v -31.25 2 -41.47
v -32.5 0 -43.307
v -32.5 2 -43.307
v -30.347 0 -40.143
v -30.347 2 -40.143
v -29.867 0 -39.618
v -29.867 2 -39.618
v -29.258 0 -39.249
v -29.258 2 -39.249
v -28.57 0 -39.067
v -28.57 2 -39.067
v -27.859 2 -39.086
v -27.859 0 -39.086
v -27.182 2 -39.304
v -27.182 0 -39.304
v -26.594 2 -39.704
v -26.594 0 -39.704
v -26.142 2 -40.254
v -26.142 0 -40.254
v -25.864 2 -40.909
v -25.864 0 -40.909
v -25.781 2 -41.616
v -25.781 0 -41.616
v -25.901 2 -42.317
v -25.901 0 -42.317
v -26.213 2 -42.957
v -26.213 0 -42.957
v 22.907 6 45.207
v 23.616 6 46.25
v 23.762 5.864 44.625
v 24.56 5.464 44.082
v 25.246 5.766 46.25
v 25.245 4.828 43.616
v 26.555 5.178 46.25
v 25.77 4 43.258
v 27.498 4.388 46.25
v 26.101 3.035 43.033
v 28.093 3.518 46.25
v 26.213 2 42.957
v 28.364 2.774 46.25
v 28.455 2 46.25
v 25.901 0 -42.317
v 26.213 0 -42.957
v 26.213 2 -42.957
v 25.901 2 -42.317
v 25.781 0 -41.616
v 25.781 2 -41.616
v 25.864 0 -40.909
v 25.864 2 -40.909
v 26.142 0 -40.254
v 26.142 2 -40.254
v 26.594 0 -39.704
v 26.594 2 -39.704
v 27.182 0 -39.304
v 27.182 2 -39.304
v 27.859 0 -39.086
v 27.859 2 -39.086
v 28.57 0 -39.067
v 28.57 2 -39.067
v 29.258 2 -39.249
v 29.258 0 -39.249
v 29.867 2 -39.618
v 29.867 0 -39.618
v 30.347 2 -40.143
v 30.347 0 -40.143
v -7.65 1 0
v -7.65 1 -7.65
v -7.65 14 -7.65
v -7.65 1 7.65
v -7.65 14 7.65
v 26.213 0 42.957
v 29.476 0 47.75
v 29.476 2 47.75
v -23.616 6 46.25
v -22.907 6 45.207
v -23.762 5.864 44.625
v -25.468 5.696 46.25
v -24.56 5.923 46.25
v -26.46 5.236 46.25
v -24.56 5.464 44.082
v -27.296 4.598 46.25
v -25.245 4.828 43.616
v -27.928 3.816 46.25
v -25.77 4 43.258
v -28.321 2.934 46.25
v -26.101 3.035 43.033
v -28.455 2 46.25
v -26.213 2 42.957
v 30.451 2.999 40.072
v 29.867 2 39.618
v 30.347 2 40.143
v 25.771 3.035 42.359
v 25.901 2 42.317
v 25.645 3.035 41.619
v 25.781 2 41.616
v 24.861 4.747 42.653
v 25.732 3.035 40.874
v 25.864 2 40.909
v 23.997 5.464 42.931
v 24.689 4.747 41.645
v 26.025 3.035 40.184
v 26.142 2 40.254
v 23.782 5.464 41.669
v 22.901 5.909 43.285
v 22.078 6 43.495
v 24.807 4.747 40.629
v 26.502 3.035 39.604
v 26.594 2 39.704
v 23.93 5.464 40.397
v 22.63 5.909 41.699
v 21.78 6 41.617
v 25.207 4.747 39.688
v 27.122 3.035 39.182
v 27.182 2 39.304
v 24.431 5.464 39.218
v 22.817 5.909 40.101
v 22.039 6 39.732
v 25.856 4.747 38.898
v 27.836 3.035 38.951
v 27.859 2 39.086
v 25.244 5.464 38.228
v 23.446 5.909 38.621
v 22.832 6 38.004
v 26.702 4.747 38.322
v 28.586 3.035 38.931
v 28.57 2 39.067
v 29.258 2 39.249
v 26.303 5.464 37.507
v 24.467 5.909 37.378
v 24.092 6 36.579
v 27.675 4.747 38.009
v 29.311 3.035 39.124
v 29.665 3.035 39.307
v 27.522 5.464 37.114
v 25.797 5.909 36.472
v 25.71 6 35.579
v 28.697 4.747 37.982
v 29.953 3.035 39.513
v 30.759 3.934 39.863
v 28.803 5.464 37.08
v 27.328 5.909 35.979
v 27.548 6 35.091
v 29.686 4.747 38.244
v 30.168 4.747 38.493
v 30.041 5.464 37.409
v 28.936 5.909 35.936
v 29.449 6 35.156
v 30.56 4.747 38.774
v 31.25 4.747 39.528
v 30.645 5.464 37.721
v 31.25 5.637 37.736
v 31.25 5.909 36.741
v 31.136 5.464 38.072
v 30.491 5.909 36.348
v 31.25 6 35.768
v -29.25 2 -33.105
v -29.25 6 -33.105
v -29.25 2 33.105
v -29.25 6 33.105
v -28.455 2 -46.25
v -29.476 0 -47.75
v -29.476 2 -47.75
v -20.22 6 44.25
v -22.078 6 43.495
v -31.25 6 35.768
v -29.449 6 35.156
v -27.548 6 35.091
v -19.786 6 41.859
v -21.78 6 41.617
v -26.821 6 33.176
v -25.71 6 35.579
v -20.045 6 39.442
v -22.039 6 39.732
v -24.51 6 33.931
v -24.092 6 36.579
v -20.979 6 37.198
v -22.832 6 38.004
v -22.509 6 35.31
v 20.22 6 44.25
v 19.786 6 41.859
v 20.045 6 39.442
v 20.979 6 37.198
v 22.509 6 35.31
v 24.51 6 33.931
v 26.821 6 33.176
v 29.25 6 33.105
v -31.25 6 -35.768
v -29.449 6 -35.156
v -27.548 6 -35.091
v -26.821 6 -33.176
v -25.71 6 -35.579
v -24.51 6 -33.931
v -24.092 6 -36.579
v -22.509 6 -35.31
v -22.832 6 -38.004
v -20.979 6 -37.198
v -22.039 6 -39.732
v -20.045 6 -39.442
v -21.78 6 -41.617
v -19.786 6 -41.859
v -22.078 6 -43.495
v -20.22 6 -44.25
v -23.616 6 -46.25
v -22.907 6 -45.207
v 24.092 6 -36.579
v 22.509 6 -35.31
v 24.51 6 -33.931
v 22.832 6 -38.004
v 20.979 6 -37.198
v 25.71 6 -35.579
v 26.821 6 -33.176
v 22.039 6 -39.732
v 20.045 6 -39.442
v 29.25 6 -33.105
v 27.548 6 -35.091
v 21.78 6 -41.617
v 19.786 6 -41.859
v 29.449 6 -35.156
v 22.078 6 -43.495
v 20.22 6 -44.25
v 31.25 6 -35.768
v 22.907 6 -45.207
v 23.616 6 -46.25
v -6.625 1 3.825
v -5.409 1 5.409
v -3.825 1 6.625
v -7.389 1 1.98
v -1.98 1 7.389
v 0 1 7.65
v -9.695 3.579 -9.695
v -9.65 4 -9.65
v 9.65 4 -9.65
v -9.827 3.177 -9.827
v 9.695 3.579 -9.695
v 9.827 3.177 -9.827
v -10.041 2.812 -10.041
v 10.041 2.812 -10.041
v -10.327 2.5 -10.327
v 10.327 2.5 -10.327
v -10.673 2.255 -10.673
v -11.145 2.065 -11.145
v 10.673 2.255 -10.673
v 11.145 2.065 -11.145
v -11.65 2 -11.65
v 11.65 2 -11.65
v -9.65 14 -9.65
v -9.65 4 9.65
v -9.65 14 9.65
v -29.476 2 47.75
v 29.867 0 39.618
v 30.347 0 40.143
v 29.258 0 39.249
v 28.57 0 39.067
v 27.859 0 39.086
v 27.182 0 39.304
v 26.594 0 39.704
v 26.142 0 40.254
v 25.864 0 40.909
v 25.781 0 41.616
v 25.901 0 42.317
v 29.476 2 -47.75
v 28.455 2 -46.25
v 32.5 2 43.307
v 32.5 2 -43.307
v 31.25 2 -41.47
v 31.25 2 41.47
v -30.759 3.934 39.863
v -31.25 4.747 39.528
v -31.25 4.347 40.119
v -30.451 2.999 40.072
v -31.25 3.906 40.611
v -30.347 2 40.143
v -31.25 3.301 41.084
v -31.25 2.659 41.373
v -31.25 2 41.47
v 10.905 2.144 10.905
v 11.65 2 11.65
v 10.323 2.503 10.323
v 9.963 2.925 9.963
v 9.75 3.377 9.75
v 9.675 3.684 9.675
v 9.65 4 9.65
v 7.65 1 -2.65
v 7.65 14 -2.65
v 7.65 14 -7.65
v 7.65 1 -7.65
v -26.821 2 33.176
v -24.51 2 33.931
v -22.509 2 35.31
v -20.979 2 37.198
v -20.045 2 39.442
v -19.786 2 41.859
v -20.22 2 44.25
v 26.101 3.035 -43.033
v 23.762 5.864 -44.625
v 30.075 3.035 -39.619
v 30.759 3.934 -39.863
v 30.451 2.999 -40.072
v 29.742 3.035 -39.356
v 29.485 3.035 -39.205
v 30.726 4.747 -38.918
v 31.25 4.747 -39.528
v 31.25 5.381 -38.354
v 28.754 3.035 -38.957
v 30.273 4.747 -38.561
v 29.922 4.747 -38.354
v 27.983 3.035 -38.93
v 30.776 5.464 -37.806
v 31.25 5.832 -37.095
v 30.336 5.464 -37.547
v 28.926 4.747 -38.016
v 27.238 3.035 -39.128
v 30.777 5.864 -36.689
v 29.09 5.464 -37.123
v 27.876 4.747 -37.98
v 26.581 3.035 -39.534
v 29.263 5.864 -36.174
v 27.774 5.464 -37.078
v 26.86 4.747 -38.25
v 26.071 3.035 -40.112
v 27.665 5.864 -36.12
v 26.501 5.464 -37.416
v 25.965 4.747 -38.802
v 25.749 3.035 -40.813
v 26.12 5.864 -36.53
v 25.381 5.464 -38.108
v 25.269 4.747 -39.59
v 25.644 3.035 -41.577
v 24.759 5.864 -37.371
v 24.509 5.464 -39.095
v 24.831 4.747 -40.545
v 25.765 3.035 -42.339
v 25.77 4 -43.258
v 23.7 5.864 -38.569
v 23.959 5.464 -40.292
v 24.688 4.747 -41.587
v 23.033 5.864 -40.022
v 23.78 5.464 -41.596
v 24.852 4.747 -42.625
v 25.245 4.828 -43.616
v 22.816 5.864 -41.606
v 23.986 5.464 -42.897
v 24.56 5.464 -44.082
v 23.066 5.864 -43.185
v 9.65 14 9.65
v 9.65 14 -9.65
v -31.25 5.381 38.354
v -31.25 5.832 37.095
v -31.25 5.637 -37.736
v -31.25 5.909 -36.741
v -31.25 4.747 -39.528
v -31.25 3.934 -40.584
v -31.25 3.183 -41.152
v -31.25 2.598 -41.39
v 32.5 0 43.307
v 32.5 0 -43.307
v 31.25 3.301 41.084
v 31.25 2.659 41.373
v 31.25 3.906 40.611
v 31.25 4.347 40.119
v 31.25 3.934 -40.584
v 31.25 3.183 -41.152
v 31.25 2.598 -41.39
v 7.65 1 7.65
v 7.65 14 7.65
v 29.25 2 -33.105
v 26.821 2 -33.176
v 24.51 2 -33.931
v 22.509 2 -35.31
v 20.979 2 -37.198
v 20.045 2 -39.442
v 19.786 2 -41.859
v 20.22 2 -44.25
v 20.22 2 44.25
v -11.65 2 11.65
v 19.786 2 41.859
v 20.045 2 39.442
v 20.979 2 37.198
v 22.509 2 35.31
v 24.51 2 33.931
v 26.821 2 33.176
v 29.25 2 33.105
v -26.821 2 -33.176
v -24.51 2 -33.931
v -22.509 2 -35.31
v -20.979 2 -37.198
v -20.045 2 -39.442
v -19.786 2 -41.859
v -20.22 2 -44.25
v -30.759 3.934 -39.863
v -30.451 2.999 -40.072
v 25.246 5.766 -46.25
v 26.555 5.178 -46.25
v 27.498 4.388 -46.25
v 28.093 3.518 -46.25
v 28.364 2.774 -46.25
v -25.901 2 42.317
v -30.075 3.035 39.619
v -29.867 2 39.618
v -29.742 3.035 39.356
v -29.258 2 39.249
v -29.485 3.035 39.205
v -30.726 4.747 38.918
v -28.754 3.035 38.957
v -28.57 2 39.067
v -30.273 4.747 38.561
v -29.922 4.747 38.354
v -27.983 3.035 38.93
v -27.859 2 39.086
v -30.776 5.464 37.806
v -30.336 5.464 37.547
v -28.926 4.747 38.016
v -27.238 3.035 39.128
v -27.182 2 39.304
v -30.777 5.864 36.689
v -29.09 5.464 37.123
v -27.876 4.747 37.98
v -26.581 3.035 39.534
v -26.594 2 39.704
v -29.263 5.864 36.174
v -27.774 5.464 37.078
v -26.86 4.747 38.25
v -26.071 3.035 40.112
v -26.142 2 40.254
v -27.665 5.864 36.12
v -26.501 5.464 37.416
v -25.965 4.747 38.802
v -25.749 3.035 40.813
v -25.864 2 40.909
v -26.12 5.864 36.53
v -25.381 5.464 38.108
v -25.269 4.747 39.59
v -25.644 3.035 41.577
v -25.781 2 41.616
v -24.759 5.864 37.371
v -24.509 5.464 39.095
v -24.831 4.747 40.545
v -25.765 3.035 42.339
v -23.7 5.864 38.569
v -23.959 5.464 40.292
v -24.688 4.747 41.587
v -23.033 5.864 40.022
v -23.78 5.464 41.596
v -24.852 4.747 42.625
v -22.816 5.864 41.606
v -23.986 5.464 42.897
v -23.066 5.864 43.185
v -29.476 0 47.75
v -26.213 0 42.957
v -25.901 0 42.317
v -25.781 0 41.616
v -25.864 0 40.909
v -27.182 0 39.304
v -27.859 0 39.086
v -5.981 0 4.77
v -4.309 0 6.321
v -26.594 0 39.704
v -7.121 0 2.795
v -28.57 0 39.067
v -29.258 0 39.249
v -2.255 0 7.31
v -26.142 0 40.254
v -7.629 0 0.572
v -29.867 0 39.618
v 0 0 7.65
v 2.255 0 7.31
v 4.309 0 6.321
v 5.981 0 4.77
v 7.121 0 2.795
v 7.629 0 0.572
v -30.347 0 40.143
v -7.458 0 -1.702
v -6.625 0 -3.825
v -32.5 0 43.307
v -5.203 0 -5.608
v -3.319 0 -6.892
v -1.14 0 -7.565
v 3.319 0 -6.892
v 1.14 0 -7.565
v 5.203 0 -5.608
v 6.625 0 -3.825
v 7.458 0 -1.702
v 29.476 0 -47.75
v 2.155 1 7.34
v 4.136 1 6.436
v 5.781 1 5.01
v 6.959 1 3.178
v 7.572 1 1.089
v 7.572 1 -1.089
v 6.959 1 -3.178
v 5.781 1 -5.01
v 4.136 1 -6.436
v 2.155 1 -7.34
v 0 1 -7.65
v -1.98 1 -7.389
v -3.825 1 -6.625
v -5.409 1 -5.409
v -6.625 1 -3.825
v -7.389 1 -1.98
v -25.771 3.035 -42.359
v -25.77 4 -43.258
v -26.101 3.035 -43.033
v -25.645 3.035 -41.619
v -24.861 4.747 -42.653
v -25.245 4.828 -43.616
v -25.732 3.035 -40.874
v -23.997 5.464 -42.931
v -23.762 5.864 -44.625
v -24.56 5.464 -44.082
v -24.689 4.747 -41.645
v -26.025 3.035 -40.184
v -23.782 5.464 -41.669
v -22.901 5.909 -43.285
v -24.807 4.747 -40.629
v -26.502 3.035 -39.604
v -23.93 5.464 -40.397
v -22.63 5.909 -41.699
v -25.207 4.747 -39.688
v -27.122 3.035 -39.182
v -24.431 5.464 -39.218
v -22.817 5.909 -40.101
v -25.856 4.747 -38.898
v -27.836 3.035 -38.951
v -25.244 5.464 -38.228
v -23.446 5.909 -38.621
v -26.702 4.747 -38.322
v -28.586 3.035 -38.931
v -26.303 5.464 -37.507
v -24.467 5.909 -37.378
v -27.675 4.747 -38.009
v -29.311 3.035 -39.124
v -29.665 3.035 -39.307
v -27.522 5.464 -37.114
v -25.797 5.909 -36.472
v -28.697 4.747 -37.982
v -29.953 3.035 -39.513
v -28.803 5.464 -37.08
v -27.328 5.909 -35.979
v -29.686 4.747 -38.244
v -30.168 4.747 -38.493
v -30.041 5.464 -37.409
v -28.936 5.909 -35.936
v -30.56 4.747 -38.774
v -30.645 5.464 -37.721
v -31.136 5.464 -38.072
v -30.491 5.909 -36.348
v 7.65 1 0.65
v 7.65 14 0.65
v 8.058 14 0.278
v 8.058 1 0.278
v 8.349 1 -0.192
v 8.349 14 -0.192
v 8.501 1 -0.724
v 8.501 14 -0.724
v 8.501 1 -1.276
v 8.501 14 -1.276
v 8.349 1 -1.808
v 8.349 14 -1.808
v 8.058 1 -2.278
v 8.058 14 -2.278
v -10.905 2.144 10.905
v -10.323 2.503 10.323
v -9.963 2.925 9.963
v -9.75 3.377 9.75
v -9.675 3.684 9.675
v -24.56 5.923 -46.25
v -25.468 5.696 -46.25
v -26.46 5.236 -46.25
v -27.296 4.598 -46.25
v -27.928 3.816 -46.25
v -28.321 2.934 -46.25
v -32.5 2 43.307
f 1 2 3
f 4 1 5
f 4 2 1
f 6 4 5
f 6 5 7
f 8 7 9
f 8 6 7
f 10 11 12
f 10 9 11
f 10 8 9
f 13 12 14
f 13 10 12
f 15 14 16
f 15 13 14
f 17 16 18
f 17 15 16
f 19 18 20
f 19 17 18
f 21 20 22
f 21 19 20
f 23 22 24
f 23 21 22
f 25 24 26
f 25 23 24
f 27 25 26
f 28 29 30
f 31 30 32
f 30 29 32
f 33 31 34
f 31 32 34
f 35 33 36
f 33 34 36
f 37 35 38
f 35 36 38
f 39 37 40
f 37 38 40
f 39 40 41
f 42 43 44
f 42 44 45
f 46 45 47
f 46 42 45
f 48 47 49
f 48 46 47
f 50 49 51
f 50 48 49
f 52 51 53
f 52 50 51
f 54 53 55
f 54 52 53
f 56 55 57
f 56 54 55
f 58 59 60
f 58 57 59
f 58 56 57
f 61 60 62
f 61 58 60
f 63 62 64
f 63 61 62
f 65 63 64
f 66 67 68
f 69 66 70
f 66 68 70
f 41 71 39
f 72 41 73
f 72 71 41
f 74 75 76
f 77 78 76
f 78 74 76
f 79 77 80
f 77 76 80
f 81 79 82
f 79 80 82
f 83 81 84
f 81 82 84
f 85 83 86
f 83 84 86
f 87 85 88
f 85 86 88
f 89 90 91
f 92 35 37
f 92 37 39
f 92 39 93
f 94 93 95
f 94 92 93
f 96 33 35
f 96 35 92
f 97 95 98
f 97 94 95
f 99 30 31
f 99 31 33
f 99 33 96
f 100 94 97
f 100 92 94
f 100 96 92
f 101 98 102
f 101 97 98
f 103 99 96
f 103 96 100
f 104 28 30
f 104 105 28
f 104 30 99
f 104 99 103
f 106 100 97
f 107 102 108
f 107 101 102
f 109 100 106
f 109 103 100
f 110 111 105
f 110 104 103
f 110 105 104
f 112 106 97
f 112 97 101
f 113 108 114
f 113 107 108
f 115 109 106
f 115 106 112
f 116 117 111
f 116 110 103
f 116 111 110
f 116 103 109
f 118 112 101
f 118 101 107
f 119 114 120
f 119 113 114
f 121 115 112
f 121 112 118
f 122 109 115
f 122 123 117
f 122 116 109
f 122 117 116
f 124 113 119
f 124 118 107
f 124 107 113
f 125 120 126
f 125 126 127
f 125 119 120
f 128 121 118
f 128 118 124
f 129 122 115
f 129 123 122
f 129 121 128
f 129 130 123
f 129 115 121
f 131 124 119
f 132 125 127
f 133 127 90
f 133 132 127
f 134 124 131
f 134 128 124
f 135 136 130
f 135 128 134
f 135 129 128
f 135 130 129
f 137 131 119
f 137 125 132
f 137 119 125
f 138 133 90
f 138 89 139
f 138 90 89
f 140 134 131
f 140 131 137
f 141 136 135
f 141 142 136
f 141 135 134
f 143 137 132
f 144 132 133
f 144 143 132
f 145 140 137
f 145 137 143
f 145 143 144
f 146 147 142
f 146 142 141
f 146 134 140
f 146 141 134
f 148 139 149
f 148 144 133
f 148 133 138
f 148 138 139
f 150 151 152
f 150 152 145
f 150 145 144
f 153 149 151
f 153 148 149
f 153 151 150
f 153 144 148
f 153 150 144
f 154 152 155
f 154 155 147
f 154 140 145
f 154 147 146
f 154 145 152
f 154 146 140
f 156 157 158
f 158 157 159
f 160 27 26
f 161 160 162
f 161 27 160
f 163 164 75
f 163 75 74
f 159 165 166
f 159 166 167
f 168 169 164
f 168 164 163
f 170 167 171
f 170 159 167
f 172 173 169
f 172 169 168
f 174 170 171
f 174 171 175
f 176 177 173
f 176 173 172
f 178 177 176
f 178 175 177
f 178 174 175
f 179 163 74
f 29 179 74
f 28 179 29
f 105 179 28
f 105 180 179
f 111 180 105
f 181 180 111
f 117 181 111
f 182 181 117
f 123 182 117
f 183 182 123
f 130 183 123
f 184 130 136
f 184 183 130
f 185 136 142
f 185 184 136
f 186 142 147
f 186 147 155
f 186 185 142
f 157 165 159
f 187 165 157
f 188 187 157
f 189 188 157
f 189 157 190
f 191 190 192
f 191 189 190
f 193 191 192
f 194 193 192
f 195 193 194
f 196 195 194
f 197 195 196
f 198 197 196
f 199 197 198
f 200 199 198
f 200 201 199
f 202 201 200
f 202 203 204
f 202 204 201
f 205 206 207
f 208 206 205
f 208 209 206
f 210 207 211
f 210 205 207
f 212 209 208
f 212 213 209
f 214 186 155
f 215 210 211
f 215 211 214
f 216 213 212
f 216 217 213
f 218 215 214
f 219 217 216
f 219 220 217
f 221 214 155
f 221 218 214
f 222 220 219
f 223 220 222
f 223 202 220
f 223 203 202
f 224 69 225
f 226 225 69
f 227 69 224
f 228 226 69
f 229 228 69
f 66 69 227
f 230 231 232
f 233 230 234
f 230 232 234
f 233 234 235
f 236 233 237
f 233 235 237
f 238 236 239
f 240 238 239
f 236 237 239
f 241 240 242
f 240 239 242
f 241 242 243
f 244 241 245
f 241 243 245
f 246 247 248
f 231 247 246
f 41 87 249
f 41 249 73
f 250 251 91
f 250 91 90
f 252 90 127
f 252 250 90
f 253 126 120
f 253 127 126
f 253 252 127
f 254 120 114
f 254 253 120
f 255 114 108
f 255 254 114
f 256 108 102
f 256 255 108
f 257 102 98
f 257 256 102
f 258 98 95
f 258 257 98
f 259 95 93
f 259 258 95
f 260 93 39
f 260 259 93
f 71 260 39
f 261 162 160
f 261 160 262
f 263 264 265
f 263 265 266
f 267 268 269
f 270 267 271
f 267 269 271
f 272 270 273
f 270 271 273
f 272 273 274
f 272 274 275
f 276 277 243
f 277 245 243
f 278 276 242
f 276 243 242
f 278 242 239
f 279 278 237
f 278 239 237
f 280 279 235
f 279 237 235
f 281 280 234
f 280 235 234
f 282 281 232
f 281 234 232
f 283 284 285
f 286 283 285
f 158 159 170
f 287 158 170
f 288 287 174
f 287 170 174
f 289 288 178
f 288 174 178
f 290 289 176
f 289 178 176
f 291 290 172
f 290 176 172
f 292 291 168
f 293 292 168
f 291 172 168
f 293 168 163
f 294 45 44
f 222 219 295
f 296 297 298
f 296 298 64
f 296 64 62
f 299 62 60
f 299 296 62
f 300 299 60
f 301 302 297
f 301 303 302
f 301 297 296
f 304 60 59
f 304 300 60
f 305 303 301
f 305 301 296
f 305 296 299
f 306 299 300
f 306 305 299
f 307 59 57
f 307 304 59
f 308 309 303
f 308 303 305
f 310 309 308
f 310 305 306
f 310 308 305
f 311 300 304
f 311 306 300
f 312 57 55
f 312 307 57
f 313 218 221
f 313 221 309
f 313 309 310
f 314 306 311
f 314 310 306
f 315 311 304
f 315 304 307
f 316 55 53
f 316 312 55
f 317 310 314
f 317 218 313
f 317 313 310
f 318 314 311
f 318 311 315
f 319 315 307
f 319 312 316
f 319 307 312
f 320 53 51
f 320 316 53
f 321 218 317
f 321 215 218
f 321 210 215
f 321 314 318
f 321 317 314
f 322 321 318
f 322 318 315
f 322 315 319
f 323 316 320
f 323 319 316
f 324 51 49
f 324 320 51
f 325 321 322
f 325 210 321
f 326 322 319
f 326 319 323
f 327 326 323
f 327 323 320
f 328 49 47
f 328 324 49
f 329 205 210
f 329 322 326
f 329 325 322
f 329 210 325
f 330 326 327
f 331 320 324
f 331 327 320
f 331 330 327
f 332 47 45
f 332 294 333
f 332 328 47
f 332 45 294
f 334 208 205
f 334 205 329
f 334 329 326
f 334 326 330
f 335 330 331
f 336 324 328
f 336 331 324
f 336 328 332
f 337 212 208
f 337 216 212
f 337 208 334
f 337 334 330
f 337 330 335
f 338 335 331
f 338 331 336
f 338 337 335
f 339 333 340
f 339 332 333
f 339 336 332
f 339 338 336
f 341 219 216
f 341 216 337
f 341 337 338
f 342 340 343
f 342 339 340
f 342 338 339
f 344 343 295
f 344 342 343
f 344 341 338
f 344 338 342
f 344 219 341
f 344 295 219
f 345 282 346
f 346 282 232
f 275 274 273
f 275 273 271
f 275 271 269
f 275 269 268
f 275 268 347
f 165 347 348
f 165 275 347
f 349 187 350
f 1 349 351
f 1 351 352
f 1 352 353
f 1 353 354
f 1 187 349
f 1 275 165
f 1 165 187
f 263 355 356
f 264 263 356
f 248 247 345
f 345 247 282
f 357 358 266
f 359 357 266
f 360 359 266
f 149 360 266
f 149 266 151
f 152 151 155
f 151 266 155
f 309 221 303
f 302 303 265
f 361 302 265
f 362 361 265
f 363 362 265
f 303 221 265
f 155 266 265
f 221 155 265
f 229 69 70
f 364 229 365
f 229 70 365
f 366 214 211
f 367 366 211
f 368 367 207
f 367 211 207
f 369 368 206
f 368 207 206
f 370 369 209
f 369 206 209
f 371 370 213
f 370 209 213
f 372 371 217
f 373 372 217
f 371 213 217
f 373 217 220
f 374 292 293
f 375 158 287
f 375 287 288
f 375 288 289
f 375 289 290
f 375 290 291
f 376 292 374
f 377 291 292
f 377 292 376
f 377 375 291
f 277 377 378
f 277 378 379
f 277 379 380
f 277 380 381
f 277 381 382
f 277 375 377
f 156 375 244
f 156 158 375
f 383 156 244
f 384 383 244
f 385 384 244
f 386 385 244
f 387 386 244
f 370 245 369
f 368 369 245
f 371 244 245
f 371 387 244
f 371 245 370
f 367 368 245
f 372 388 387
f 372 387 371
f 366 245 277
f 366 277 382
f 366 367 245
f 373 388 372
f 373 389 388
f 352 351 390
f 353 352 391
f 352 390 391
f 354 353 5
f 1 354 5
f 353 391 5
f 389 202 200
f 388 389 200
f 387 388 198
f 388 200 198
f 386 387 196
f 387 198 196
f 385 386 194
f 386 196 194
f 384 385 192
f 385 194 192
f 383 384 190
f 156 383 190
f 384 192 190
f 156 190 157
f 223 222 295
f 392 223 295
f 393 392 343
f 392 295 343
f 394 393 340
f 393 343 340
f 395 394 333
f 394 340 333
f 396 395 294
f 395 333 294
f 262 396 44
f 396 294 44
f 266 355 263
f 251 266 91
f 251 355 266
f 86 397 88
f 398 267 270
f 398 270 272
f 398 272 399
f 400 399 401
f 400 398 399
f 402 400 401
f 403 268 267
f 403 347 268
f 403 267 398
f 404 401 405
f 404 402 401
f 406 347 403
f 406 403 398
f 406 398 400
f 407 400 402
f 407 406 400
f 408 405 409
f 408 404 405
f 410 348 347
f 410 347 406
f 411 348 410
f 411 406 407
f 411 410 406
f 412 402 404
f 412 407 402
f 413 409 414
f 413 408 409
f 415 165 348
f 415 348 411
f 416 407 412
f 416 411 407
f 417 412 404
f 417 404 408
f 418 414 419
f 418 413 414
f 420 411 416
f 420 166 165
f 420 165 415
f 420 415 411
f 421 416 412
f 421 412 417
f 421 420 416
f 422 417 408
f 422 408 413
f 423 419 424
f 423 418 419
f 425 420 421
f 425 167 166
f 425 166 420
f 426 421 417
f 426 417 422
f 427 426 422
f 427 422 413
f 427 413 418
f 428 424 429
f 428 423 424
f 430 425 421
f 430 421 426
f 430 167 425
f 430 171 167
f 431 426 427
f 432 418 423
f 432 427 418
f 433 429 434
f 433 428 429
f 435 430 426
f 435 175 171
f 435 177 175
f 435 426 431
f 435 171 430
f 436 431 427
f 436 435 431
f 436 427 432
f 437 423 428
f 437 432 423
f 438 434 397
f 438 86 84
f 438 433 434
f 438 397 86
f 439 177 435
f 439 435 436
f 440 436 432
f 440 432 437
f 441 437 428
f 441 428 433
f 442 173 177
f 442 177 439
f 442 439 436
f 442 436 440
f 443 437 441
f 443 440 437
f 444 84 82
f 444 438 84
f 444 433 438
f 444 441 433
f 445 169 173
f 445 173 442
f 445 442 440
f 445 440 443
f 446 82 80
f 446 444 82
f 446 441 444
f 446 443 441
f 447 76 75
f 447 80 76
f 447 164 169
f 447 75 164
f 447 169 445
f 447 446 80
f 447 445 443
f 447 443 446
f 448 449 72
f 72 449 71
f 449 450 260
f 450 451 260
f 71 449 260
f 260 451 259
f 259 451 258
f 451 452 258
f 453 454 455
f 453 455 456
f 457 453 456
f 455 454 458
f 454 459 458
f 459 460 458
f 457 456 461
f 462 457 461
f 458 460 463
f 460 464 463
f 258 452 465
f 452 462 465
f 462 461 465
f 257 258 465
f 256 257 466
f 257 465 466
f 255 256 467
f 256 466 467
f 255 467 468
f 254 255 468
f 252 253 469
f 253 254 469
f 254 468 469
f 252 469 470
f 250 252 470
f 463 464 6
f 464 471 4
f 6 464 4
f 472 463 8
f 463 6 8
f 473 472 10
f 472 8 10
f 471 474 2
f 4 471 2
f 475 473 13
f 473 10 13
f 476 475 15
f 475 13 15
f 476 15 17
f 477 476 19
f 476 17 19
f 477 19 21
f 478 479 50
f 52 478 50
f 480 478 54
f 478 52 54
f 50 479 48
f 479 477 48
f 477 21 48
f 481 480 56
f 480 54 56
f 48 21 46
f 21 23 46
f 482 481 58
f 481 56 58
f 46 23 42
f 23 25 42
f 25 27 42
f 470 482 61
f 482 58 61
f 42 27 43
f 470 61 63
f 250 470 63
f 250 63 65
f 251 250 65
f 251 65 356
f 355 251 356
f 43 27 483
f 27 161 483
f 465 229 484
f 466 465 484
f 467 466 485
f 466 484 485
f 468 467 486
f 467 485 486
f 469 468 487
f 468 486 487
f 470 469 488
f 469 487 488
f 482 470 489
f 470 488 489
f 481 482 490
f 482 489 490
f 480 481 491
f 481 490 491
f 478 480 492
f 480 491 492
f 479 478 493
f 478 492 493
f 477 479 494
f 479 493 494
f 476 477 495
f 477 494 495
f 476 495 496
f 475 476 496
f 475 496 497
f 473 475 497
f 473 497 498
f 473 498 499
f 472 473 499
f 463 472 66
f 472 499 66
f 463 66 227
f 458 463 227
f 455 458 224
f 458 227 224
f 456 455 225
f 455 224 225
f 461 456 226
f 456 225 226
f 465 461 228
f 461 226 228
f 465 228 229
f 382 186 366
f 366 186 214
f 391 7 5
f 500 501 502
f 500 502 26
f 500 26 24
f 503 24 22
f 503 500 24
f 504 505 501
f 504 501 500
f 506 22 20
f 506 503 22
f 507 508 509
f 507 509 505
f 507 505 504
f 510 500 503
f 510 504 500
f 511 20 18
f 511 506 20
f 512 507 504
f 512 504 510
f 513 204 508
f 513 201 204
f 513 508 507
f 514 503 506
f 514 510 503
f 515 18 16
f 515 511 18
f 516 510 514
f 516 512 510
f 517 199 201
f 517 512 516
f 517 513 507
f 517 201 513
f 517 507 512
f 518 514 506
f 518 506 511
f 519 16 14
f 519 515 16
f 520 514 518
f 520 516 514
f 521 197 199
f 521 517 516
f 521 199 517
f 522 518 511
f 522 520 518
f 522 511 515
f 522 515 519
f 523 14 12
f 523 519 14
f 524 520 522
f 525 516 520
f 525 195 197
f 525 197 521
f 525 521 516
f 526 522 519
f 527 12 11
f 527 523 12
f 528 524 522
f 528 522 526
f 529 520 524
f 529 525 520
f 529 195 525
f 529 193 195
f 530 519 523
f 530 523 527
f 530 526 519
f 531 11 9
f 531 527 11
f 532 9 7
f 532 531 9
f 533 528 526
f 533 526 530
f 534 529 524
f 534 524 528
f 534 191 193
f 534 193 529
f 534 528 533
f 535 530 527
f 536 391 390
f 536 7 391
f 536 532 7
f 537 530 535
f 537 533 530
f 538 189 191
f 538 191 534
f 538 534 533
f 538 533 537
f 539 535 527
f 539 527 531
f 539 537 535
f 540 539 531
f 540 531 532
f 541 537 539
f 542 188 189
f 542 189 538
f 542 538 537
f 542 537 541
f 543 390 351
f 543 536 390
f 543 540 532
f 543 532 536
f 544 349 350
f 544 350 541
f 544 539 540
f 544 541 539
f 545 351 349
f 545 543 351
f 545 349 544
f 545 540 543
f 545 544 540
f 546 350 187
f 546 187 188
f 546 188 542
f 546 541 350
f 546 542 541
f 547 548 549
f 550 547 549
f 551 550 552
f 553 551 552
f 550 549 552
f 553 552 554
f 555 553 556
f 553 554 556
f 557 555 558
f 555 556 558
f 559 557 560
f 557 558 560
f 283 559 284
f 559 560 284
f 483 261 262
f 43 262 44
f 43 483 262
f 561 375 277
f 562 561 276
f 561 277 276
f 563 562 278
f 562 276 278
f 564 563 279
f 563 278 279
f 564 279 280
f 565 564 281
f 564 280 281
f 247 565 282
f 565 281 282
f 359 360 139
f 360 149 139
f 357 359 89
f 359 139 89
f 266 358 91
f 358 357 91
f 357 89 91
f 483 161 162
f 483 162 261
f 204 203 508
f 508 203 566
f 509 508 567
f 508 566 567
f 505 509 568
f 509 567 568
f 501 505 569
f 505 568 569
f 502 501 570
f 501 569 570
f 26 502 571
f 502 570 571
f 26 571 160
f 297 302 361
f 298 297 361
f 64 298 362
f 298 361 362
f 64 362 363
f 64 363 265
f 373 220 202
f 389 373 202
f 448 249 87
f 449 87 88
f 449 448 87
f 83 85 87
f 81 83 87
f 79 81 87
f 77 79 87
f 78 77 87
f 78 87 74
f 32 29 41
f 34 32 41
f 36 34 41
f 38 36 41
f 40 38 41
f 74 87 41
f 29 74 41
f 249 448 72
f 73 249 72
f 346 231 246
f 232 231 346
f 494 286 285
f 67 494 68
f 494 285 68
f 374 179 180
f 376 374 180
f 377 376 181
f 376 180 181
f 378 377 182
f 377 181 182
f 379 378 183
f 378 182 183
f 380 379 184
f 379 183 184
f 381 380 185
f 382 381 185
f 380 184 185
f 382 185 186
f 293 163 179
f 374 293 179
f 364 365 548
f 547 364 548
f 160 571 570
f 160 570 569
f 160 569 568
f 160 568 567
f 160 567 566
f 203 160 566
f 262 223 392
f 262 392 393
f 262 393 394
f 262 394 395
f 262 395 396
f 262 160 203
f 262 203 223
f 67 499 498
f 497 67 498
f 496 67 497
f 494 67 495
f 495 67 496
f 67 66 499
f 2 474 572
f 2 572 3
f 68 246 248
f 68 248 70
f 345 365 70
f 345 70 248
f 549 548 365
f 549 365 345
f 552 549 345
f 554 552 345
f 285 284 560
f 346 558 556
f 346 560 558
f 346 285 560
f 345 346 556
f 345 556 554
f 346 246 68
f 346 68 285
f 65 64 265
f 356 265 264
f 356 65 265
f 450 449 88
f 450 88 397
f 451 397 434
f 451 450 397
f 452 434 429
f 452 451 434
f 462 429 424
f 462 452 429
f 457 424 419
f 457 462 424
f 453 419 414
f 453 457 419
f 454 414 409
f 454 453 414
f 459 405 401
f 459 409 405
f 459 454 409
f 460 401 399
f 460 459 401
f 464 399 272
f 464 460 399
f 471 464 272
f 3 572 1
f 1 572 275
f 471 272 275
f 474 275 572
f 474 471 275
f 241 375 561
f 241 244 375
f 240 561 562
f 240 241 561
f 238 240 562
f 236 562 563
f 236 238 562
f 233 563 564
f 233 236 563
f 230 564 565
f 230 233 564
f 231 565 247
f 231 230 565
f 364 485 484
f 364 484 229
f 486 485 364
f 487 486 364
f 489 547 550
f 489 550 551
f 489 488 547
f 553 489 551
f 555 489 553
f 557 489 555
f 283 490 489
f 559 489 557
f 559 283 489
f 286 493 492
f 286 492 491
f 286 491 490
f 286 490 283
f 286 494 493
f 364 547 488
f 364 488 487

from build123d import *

# Parameters (mm, degrees)
SKETCH1_W           = 65
SKETCH1_H           = 95.5
BOSS_EXTRUDE1_DEPTH = 2
SKETCH1_3_W         = 62.5
SKETCH1_3_H         = 92.5
BOSS_EXTRUDE2_DEPTH = 6
BOSS_EXTRUDE3_START = 6
SKETCH2_4_W         = 19.3
SKETCH2_4_H         = 19.3
BOSS_EXTRUDE3_DEPTH = 8
SKETCH2_R           = 7.65
CUT_EXTRUDE1_DEPTH  = 19.5
CUT_EXTRUDE2_START  = 40
CUT_EXTRUDE2_DEPTH  = 39
CUT_EXTRUDE3_DEPTH  = 10
FILLET1_R           = 4
SKETCH5_W           = 19.3
SKETCH5_H           = 19.3
CUT_EXTRUDE5_DEPTH  = 4
FILLET2_R           = 2


with BuildPart() as part:
    # Sketch1 → Boss-Extrude1 (new body)
    with BuildSketch(Plane(origin=(0, 0, 0), x_dir=(1, 0, 0), z_dir=(0, 1, 0))):
        Rectangle(SKETCH1_W, SKETCH1_H)
    extrude(amount=BOSS_EXTRUDE1_DEPTH)

    # Sketch1<3> → Boss-Extrude2 (add)
    with BuildSketch(Plane(origin=(0, 0, 0), x_dir=(1, 0, 0), z_dir=(0, 1, 0))):
        Rectangle(SKETCH1_3_W, SKETCH1_3_H)
    extrude(amount=BOSS_EXTRUDE2_DEPTH)

    # Sketch2<4> → Boss-Extrude3 (add)
    with BuildSketch(Plane(origin=(0, 0, 0), x_dir=(1, 0, 0), z_dir=(0, 1, 0)).offset(BOSS_EXTRUDE3_START)):
        Rectangle(SKETCH2_4_W, SKETCH2_4_H)
    extrude(amount=BOSS_EXTRUDE3_DEPTH)

    # Sketch2 → Cut-Extrude1 (cut, symmetric)
    with BuildSketch(Plane(origin=(0, 0, 0), x_dir=(1, 0, 0), z_dir=(0, 1, 0))):
        with Locations(Location((0, 0, 0), (0, 0, 270))):
            Circle(SKETCH2_R)
    extrude(amount=CUT_EXTRUDE1_DEPTH, both=True, mode=Mode.SUBTRACT)

    # Sketch2<3> → Cut-Extrude2 (cut)
    with BuildSketch(Plane(origin=(0, 0, 0), x_dir=(1, 0, 0), z_dir=(0, 1, 0)).offset(CUT_EXTRUDE2_START)):
        with BuildLine():
            Line((9e-09, 7.65), (-7.65, 7.65))
            Line((-7.65, 7.65), (-7.65, 0))
            ThreePointArc((-7.65, 0), (-5.409366873, 5.409366879), (9e-09, 7.65))
        make_face()
        with BuildLine():
            Line((7.65, 7.65), (9e-09, 7.65))
            ThreePointArc((9e-09, 7.65), (7.65, 0), (9e-09, -7.65))
            Line((9e-09, -7.65), (7.65, -7.65))
            Line((7.65, -7.65), (7.65, -0.65))
            ThreePointArc((7.65, -0.65), (8.519734544, 1), (7.65, 2.65))
            Line((7.65, 2.65), (7.65, 7.65))
        make_face()
        with BuildLine():
            ThreePointArc((9e-09, -7.65), (-5.409366873, -5.409366879), (-7.65, 0))
            Line((-7.65, 0), (-7.65, -7.65))
            Line((-7.65, -7.65), (9e-09, -7.65))
        make_face()
    extrude(amount=-CUT_EXTRUDE2_DEPTH, mode=Mode.SUBTRACT)

    # Sketch3 → Cut-Extrude3 (cut)
    with BuildSketch(Plane(origin=(0, 0, 0), x_dir=(1, 0, 0), z_dir=(0, 1, 0))):
        with BuildLine():
            Line((-30.433287704, 49.156662819), (-34.566712296, 46.343337181))
            Line((-34.566712296, 46.343337181), (-30.346723838, 40.143200294))
            ThreePointArc((-30.346723838, 40.143200294), (-26.873348724, 39.483150817), (-26.213299247, 42.956525932))
            Line((-26.213299247, 42.956525932), (-30.433287704, 49.156662819))
        make_face()
        with BuildLine():
            Line((34.566712296, 46.343337181), (30.433287704, 49.156662819))
            Line((30.433287704, 49.156662819), (26.213299247, 42.956525932))
            ThreePointArc((26.213299247, 42.956525932), (26.873348724, 39.483150817), (30.346723838, 40.143200294))
            Line((30.346723838, 40.143200294), (34.566712296, 46.343337181))
        make_face()
        with BuildLine():
            Line((-30.346723838, -40.143200294), (-34.566712296, -46.343337181))
            Line((-34.566712296, -46.343337181), (-30.433287704, -49.156662819))
            Line((-30.433287704, -49.156662819), (-26.213299247, -42.956525932))
            ThreePointArc((-26.213299247, -42.956525932), (-26.873348724, -39.483150817), (-30.346723838, -40.143200294))
        make_face()
        with BuildLine():
            Line((26.213299247, -42.956525932), (30.433287704, -49.156662819))
            Line((30.433287704, -49.156662819), (34.566712296, -46.343337181))
            Line((34.566712296, -46.343337181), (30.346723838, -40.143200294))
            ThreePointArc((30.346723838, -40.143200294), (26.873348724, -39.483150817), (26.213299247, -42.956525932))
        make_face()
    extrude(amount=CUT_EXTRUDE3_DEPTH, mode=Mode.SUBTRACT)

    # Fillet1
    # the kernel refuses this fillet: 4 mm, written as the material it takes off along each edge
    with BuildSketch(Plane(origin=(-36.876651276, 6, 49.737170606), x_dir=(0, -1, 0), z_dir=(0.5626651276372232, 0, -0.826684918297768)), Plane(origin=(30.346723838, 6, 40.143200294), x_dir=(0, -1, 0), z_dir=(0.5626651276372238, 0, 0.8266849182977677)), Plane(origin=(36.876651276, 6, -49.737170606), x_dir=(0, -1, 0), z_dir=(-0.562665127637224, 0, 0.8266849182977676)), Plane(origin=(-30.346723838, 6, -40.143200294), x_dir=(0, -1, 0), z_dir=(-0.5626651276372242, 0, -0.8266849182977674))) as fillet1_piece_1:
        with BuildLine():
            CenterArc((FILLET1_R, FILLET1_R), FILLET1_R, 180, 90)
            Line((0, FILLET1_R), (0, 0))
            Line((0, 0), (FILLET1_R, 0))
        make_face()
    extrude(amount=11.605353019, mode=Mode.SUBTRACT)
    with BuildSketch(Plane(origin=(-26.213299247, 6, 42.956525932), x_dir=(0, -1, 0), z_dir=(-0.5626651276372243, 0, 0.8266849182977672)), Plane(origin=(34.081582088, 6, 54.516849183), x_dir=(0, -1, 0), z_dir=(-0.5626651276372246, 0, -0.826684918297767)), Plane(origin=(26.213299247, 6, -42.956525932), x_dir=(0, -1, 0), z_dir=(0.5626651276372232, 0, -0.826684918297768)), Plane(origin=(-34.081582088, 6, -54.516849183), x_dir=(0, -1, 0), z_dir=(0.562665127637224, 0, 0.8266849182977676))) as fillet1_piece_2:
        with BuildLine():
            CenterArc((FILLET1_R, FILLET1_R), FILLET1_R, 180, 90)
            Line((0, FILLET1_R), (0, 0))
            Line((0, 0), (FILLET1_R, 0))
        make_face()
    extrude(amount=13.983953251, mode=Mode.SUBTRACT)
    with BuildSketch(Plane(origin=(-28.280011543, 6, 41.549863113), x_dir=(-0.8266849182977704, 0, -0.5626651276372198), z_dir=(-0.5626651276372198, 0, 0.8266849182977704))) as fillet1_piece_3:
        with BuildLine():
            CenterArc((2.5 + FILLET1_R, FILLET1_R), FILLET1_R, 180, 90)
            Line((2.5 + FILLET1_R, 0), (2.5, 0))
            Line((2.5, 0), (2.5, FILLET1_R))
        make_face()
    revolve(axis=Axis((-28.280011543, 6, 41.549863113), (0, -1, 0)), revolution_arc=180, mode=Mode.SUBTRACT)
    with BuildSketch(Plane(origin=(28.280011543, 6, 41.549863113), x_dir=(-0.8266849182977659, 0, 0.5626651276372262), z_dir=(0.5626651276372262, 0, 0.8266849182977659))) as fillet1_piece_4:
        with BuildLine():
            CenterArc((2.5 + FILLET1_R, FILLET1_R), FILLET1_R, 180, 90)
            Line((2.5 + FILLET1_R, 0), (2.5, 0))
            Line((2.5, 0), (2.5, FILLET1_R))
        make_face()
    revolve(axis=Axis((28.280011543, 6, 41.549863113), (0, -1, 0)), revolution_arc=180, mode=Mode.SUBTRACT)
    with BuildSketch(Plane(origin=(28.280011543, 6, -41.549863113), x_dir=(0.826684918297769, 0, 0.5626651276372218), z_dir=(0.5626651276372218, 0, -0.826684918297769))) as fillet1_piece_5:
        with BuildLine():
            CenterArc((2.5 + FILLET1_R, FILLET1_R), FILLET1_R, 180, 90)
            Line((2.5 + FILLET1_R, 0), (2.5, 0))
            Line((2.5, 0), (2.5, FILLET1_R))
        make_face()
    revolve(axis=Axis((28.280011543, 6, -41.549863113), (0, -1, 0)), revolution_arc=180, mode=Mode.SUBTRACT)
    with BuildSketch(Plane(origin=(-28.280011543, 6, -41.549863113), x_dir=(0.8266849182977655, 0, -0.562665127637227), z_dir=(-0.562665127637227, 0, -0.8266849182977655))) as fillet1_piece_6:
        with BuildLine():
            CenterArc((2.5 + FILLET1_R, FILLET1_R), FILLET1_R, 180, 90)
            Line((2.5 + FILLET1_R, 0), (2.5, 0))
            Line((2.5, 0), (2.5, FILLET1_R))
        make_face()
    revolve(axis=Axis((-28.280011543, 6, -41.549863113), (0, -1, 0)), revolution_arc=180, mode=Mode.SUBTRACT)

    # Sketch5 → Cut-Extrude5 (cut)
    with BuildSketch(Plane(origin=(0, 6, 0), x_dir=(1, 0, 0), z_dir=(0, 1, 0))):
        with BuildLine():
            Line((-20.220280729, -44.25), (20.220280729, -44.25))
            ThreePointArc((20.220280729, -44.25), (21.675717981, -36.198853249), (29.25, -33.105390223))
            Line((29.25, -33.105390223), (29.25, 33.105390223))
            ThreePointArc((29.25, 33.105390223), (21.675717981, 36.198853249), (20.220280729, 44.25))
            Line((20.220280729, 44.25), (-20.220280729, 44.25))
            ThreePointArc((-20.220280729, 44.25), (-21.675717981, 36.198853249), (-29.25, 33.105390223))
            Line((-29.25, 33.105390223), (-29.25, -33.105390223))
            ThreePointArc((-29.25, -33.105390223), (-21.675717981, -36.198853249), (-20.220280729, -44.25))
        make_face()
        Rectangle(SKETCH5_W, SKETCH5_H, mode=Mode.SUBTRACT)
    extrude(amount=-CUT_EXTRUDE5_DEPTH, mode=Mode.SUBTRACT)

    # Fillet2
    fillet2_edges = [part.edges().sort_by_distance(p)[0] for p in [
        (0, 2, -9.65),
        (-9.65, 2, 0),
        (0, 2, 9.65),
        (9.65, 2, 0),
    ]]
    fillet(fillet2_edges, radius=FILLET2_R)


solid = part.part
